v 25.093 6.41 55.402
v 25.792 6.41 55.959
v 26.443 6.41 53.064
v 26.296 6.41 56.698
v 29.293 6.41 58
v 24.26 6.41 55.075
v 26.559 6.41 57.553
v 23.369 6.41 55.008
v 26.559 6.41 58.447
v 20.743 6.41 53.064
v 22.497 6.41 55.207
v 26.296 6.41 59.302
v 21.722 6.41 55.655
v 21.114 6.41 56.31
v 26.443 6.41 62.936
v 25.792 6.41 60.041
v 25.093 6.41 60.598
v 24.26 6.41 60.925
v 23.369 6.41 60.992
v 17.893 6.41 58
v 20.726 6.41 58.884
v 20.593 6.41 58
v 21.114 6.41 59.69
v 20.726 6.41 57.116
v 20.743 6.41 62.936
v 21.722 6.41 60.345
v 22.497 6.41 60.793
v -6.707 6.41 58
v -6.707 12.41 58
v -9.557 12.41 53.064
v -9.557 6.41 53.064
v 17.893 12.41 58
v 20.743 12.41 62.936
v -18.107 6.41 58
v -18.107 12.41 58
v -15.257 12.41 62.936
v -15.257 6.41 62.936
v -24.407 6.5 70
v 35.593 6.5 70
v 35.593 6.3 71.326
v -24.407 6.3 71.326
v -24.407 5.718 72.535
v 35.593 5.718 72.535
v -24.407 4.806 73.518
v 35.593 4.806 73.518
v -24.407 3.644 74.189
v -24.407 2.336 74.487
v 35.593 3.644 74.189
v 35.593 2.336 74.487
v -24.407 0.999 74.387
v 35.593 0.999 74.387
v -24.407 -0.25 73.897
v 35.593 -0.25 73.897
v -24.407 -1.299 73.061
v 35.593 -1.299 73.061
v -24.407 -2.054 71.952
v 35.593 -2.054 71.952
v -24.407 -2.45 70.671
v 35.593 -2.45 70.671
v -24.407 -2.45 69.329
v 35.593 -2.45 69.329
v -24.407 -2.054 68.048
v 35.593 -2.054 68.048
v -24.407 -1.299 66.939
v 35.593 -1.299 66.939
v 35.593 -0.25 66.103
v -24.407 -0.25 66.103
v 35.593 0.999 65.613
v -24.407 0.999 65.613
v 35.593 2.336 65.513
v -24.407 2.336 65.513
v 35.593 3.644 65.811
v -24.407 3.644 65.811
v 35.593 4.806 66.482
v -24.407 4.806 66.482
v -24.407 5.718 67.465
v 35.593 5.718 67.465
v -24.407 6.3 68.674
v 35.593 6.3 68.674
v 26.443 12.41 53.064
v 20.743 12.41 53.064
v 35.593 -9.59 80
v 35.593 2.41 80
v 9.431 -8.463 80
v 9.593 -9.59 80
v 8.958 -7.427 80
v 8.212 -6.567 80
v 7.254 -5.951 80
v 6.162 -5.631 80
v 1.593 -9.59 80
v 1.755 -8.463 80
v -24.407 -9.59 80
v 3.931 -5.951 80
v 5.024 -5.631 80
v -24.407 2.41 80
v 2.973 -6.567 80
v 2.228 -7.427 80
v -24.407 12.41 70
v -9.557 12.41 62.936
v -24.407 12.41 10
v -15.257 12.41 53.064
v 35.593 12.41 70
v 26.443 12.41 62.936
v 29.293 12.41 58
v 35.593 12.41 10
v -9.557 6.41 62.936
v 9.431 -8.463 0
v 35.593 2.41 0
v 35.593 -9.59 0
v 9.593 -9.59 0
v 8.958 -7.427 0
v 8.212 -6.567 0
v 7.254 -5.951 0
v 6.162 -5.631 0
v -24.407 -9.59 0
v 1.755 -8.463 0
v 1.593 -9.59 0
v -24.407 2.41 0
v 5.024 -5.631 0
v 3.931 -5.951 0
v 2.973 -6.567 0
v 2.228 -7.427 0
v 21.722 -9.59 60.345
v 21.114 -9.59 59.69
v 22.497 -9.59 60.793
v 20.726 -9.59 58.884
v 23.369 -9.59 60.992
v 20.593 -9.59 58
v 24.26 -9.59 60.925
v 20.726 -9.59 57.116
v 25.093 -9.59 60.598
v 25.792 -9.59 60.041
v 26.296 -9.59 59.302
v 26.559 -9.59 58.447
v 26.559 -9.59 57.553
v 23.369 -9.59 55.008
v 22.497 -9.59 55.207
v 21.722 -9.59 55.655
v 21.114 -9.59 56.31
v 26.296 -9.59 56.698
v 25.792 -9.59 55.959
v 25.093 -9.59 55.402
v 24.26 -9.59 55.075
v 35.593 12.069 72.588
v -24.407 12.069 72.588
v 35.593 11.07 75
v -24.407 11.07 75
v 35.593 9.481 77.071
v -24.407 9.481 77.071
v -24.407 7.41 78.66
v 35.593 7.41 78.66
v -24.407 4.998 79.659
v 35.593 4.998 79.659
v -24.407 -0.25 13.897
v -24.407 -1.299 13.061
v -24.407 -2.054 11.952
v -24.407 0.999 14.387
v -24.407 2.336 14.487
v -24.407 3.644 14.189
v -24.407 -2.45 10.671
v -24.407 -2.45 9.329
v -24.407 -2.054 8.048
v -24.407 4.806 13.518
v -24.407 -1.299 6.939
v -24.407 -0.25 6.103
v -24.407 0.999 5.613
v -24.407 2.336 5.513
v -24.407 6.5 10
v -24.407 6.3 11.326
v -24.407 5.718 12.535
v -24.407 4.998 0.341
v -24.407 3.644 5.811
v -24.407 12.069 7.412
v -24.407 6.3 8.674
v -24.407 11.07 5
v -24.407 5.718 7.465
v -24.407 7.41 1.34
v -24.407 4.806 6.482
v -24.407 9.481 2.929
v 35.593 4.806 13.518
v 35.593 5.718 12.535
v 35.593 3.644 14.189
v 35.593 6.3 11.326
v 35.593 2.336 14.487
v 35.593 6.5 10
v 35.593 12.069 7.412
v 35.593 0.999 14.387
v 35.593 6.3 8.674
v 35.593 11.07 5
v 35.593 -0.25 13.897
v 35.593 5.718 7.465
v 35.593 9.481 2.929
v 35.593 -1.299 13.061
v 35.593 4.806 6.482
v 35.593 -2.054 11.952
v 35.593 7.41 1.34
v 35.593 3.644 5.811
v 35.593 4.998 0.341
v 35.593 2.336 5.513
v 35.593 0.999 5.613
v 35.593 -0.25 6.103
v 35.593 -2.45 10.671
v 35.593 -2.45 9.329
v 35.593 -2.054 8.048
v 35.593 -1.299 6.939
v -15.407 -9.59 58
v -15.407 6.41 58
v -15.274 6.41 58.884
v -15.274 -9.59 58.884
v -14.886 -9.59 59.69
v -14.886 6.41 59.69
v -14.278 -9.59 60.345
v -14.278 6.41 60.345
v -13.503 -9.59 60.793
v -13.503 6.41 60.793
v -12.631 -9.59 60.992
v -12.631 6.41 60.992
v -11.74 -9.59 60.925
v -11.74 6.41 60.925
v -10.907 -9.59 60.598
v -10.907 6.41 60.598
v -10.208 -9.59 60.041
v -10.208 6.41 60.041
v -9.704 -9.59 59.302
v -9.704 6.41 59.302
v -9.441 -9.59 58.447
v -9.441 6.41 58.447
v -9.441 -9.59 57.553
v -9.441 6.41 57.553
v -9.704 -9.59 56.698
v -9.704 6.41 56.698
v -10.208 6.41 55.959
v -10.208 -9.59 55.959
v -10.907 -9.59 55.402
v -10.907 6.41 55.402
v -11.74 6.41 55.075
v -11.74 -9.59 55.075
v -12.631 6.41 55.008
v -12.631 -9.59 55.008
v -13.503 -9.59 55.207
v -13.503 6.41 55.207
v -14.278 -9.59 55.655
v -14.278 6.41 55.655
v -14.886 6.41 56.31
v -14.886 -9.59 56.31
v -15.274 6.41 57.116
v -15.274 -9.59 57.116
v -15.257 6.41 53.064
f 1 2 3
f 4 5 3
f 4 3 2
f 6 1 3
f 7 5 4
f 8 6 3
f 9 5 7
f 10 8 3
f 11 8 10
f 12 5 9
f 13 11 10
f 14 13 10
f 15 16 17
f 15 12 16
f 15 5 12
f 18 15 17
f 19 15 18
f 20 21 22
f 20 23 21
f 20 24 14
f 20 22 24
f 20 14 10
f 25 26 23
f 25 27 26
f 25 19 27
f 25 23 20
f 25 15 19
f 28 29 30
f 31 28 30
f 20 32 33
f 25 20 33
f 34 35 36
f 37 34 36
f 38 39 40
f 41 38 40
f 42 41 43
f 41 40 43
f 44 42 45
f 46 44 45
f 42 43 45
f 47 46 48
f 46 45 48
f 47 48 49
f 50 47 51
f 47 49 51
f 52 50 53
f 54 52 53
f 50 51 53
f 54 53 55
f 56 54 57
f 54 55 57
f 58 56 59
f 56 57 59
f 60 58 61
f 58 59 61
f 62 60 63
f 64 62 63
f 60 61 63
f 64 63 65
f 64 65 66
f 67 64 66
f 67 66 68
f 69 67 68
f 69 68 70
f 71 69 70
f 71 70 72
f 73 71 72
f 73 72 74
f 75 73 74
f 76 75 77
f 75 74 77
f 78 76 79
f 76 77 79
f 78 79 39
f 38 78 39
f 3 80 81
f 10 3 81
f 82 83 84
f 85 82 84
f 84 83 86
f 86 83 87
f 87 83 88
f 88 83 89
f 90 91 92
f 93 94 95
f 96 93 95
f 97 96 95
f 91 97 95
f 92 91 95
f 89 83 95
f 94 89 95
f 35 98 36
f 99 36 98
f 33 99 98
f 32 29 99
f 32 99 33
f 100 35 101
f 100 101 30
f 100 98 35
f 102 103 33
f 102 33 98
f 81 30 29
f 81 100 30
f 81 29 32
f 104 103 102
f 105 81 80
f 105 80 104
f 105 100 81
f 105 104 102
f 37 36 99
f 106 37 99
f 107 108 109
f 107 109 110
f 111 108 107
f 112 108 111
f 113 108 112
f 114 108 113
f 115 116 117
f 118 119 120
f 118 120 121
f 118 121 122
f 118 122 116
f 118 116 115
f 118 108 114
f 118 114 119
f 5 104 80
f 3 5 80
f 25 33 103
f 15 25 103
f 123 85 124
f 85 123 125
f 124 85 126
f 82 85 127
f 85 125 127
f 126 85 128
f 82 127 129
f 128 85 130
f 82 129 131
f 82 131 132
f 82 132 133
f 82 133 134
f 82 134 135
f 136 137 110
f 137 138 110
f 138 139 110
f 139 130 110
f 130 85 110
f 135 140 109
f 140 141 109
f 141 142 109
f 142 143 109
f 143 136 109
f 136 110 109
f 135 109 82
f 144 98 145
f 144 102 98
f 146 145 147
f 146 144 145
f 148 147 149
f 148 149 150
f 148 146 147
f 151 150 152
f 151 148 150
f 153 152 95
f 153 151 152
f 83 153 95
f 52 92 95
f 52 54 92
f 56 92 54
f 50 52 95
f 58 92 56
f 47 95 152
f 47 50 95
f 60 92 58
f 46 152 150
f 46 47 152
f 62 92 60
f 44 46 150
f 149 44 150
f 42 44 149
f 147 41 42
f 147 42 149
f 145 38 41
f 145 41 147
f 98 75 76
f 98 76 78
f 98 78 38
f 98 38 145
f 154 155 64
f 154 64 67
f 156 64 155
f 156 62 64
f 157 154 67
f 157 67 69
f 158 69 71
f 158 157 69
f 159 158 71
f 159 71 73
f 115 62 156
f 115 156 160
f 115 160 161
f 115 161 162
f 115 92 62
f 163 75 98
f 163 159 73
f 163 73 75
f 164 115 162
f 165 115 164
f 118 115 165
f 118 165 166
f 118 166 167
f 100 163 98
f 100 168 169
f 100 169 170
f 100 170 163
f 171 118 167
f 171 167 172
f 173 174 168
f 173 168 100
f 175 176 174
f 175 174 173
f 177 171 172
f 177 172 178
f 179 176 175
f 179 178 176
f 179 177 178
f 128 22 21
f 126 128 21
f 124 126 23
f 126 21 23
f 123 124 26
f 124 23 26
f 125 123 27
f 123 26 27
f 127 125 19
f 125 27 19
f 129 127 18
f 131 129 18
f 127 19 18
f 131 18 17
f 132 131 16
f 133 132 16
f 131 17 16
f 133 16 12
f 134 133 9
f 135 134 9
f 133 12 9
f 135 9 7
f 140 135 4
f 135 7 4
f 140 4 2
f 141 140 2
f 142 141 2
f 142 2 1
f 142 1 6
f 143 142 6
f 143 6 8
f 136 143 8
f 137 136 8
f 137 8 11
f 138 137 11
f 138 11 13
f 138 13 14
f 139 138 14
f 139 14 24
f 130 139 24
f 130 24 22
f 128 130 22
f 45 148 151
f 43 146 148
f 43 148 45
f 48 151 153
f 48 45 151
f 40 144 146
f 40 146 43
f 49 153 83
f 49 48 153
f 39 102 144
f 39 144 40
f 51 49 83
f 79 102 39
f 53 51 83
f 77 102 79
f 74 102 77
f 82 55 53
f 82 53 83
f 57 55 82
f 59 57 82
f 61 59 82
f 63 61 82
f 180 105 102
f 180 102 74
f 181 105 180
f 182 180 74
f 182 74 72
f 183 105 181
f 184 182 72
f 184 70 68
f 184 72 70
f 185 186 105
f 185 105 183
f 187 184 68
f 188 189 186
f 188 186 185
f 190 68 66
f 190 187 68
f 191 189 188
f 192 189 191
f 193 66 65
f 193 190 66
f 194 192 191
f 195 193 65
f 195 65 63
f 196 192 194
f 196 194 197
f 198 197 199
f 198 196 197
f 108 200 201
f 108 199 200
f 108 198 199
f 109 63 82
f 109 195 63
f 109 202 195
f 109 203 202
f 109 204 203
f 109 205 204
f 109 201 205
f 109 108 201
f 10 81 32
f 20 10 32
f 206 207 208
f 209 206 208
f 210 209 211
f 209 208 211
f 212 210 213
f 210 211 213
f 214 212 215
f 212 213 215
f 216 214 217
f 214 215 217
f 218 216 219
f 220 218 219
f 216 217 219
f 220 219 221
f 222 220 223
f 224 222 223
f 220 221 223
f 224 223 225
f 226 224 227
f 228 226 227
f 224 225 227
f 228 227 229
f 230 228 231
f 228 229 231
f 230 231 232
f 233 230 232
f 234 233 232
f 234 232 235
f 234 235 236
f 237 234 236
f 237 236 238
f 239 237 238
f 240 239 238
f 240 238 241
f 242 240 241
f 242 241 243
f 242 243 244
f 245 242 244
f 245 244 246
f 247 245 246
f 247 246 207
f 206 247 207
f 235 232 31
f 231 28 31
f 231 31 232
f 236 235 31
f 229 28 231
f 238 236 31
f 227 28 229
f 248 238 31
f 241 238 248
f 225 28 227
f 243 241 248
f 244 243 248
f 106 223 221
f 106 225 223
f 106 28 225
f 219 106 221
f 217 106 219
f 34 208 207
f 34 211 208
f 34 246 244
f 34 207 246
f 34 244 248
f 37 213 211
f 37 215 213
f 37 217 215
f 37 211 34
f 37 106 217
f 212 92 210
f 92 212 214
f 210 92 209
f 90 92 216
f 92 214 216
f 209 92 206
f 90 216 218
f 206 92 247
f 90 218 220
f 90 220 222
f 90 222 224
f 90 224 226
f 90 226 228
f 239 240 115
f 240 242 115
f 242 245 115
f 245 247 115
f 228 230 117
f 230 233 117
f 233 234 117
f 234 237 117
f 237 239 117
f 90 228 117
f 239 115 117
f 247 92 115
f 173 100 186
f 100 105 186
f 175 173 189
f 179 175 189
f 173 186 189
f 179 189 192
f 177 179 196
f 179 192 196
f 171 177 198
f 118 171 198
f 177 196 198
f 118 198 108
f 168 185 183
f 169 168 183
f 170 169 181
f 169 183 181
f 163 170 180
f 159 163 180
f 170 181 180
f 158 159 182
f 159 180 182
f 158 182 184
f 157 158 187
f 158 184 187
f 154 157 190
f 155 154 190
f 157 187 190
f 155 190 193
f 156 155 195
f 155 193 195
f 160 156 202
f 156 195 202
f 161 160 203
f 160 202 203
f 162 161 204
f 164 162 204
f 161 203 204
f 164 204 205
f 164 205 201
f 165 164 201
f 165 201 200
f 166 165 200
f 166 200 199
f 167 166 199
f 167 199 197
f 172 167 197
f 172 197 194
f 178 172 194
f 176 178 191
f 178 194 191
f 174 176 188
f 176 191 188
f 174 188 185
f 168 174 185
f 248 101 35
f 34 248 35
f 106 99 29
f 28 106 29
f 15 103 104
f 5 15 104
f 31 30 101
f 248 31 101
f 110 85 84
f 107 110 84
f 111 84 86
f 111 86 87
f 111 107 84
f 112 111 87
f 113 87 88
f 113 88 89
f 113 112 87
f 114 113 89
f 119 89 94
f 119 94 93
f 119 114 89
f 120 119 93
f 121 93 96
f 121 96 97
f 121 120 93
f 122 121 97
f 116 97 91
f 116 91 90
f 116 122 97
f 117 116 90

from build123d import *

# Parameters (mm, degrees)
SKETCH002_R  = 3
PAD002_DEPTH = 22
SKETCH001_R  = 4.5
PAD001_DEPTH = 60
PAD003_DEPTH = 6
PAD_DEPTH    = 80
FILLET_R     = 10


with BuildPart() as motormount:
    # Sketch002 → Pad002 (new body)
    with BuildSketch(Plane(origin=(0, 12.41006, 0), x_dir=(-1, 0, 0), z_dir=(0, 1, 0))):
        with Locations((-23.592787, 58)):
            Circle(SKETCH002_R)
        with Locations((12.407213, 58)):
            Circle(SKETCH002_R)
    extrude(amount=-PAD002_DEPTH)


with BuildPart() as framemount:
    # Sketch001 → Pad001 (new body)
    with BuildSketch(Plane.YZ.offset(35.592787)):
        with Locations((2, 70)):
            Circle(SKETCH001_R)
        with Locations((2, 10)):
            Circle(SKETCH001_R)
    extrude(amount=-PAD001_DEPTH)


with BuildPart() as cutblock:
    # Sketch003 → Pad003 (new body)
    with BuildSketch(Plane(origin=(0, 12.41006, 0), x_dir=(-1, 0, 0), z_dir=(0, 1, 0))):
        Polygon((-20.742787, 53.063655), (-17.892787, 58), (-20.742787, 62.936345), (-26.442787, 62.936345), (-29.292787, 58), (-26.442787, 53.063655), align=None)
        Polygon((15.257213, 53.063655), (18.107213, 58), (15.257213, 62.936345), (9.557213, 62.936345), (6.707213, 58), (9.557213, 53.063655), align=None)
    extrude(amount=-PAD003_DEPTH)

    # Fusion: union MotorMount, FrameMount
    add(motormount.part)
    add(framemount.part)


with BuildPart() as fillet_body:
    # Sketch → Pad (new body)
    with BuildSketch(Plane.XY):
        with BuildLine():
            Line((-24.407213, 12.41006), (35.592787, 12.41006))
            Line((35.592787, 12.41006), (35.592787, -9.58994))
            Line((9.592787, -9.58994), (35.592787, -9.58994))
            ThreePointArc((9.592787, -9.58994), (5.592787, -5.58994), (1.592787, -9.58994))
            Line((-24.407213, -9.58994), (1.592787, -9.58994))
            Line((-24.407213, -9.58994), (-24.407213, 12.41006))
        make_face()
    extrude(amount=PAD_DEPTH)

    # Cut: cut CutBlock
    add(cutblock.part, mode=Mode.SUBTRACT)

    # Fillet
    fillet_edges = [fillet_body.edges().sort_by_distance(p)[0] for p in [
        (5.592787, 12.41006, 80),
        (5.592787, 12.41006, 0),
    ]]
    fillet(fillet_edges, radius=FILLET_R)


solid = fillet_body.part
